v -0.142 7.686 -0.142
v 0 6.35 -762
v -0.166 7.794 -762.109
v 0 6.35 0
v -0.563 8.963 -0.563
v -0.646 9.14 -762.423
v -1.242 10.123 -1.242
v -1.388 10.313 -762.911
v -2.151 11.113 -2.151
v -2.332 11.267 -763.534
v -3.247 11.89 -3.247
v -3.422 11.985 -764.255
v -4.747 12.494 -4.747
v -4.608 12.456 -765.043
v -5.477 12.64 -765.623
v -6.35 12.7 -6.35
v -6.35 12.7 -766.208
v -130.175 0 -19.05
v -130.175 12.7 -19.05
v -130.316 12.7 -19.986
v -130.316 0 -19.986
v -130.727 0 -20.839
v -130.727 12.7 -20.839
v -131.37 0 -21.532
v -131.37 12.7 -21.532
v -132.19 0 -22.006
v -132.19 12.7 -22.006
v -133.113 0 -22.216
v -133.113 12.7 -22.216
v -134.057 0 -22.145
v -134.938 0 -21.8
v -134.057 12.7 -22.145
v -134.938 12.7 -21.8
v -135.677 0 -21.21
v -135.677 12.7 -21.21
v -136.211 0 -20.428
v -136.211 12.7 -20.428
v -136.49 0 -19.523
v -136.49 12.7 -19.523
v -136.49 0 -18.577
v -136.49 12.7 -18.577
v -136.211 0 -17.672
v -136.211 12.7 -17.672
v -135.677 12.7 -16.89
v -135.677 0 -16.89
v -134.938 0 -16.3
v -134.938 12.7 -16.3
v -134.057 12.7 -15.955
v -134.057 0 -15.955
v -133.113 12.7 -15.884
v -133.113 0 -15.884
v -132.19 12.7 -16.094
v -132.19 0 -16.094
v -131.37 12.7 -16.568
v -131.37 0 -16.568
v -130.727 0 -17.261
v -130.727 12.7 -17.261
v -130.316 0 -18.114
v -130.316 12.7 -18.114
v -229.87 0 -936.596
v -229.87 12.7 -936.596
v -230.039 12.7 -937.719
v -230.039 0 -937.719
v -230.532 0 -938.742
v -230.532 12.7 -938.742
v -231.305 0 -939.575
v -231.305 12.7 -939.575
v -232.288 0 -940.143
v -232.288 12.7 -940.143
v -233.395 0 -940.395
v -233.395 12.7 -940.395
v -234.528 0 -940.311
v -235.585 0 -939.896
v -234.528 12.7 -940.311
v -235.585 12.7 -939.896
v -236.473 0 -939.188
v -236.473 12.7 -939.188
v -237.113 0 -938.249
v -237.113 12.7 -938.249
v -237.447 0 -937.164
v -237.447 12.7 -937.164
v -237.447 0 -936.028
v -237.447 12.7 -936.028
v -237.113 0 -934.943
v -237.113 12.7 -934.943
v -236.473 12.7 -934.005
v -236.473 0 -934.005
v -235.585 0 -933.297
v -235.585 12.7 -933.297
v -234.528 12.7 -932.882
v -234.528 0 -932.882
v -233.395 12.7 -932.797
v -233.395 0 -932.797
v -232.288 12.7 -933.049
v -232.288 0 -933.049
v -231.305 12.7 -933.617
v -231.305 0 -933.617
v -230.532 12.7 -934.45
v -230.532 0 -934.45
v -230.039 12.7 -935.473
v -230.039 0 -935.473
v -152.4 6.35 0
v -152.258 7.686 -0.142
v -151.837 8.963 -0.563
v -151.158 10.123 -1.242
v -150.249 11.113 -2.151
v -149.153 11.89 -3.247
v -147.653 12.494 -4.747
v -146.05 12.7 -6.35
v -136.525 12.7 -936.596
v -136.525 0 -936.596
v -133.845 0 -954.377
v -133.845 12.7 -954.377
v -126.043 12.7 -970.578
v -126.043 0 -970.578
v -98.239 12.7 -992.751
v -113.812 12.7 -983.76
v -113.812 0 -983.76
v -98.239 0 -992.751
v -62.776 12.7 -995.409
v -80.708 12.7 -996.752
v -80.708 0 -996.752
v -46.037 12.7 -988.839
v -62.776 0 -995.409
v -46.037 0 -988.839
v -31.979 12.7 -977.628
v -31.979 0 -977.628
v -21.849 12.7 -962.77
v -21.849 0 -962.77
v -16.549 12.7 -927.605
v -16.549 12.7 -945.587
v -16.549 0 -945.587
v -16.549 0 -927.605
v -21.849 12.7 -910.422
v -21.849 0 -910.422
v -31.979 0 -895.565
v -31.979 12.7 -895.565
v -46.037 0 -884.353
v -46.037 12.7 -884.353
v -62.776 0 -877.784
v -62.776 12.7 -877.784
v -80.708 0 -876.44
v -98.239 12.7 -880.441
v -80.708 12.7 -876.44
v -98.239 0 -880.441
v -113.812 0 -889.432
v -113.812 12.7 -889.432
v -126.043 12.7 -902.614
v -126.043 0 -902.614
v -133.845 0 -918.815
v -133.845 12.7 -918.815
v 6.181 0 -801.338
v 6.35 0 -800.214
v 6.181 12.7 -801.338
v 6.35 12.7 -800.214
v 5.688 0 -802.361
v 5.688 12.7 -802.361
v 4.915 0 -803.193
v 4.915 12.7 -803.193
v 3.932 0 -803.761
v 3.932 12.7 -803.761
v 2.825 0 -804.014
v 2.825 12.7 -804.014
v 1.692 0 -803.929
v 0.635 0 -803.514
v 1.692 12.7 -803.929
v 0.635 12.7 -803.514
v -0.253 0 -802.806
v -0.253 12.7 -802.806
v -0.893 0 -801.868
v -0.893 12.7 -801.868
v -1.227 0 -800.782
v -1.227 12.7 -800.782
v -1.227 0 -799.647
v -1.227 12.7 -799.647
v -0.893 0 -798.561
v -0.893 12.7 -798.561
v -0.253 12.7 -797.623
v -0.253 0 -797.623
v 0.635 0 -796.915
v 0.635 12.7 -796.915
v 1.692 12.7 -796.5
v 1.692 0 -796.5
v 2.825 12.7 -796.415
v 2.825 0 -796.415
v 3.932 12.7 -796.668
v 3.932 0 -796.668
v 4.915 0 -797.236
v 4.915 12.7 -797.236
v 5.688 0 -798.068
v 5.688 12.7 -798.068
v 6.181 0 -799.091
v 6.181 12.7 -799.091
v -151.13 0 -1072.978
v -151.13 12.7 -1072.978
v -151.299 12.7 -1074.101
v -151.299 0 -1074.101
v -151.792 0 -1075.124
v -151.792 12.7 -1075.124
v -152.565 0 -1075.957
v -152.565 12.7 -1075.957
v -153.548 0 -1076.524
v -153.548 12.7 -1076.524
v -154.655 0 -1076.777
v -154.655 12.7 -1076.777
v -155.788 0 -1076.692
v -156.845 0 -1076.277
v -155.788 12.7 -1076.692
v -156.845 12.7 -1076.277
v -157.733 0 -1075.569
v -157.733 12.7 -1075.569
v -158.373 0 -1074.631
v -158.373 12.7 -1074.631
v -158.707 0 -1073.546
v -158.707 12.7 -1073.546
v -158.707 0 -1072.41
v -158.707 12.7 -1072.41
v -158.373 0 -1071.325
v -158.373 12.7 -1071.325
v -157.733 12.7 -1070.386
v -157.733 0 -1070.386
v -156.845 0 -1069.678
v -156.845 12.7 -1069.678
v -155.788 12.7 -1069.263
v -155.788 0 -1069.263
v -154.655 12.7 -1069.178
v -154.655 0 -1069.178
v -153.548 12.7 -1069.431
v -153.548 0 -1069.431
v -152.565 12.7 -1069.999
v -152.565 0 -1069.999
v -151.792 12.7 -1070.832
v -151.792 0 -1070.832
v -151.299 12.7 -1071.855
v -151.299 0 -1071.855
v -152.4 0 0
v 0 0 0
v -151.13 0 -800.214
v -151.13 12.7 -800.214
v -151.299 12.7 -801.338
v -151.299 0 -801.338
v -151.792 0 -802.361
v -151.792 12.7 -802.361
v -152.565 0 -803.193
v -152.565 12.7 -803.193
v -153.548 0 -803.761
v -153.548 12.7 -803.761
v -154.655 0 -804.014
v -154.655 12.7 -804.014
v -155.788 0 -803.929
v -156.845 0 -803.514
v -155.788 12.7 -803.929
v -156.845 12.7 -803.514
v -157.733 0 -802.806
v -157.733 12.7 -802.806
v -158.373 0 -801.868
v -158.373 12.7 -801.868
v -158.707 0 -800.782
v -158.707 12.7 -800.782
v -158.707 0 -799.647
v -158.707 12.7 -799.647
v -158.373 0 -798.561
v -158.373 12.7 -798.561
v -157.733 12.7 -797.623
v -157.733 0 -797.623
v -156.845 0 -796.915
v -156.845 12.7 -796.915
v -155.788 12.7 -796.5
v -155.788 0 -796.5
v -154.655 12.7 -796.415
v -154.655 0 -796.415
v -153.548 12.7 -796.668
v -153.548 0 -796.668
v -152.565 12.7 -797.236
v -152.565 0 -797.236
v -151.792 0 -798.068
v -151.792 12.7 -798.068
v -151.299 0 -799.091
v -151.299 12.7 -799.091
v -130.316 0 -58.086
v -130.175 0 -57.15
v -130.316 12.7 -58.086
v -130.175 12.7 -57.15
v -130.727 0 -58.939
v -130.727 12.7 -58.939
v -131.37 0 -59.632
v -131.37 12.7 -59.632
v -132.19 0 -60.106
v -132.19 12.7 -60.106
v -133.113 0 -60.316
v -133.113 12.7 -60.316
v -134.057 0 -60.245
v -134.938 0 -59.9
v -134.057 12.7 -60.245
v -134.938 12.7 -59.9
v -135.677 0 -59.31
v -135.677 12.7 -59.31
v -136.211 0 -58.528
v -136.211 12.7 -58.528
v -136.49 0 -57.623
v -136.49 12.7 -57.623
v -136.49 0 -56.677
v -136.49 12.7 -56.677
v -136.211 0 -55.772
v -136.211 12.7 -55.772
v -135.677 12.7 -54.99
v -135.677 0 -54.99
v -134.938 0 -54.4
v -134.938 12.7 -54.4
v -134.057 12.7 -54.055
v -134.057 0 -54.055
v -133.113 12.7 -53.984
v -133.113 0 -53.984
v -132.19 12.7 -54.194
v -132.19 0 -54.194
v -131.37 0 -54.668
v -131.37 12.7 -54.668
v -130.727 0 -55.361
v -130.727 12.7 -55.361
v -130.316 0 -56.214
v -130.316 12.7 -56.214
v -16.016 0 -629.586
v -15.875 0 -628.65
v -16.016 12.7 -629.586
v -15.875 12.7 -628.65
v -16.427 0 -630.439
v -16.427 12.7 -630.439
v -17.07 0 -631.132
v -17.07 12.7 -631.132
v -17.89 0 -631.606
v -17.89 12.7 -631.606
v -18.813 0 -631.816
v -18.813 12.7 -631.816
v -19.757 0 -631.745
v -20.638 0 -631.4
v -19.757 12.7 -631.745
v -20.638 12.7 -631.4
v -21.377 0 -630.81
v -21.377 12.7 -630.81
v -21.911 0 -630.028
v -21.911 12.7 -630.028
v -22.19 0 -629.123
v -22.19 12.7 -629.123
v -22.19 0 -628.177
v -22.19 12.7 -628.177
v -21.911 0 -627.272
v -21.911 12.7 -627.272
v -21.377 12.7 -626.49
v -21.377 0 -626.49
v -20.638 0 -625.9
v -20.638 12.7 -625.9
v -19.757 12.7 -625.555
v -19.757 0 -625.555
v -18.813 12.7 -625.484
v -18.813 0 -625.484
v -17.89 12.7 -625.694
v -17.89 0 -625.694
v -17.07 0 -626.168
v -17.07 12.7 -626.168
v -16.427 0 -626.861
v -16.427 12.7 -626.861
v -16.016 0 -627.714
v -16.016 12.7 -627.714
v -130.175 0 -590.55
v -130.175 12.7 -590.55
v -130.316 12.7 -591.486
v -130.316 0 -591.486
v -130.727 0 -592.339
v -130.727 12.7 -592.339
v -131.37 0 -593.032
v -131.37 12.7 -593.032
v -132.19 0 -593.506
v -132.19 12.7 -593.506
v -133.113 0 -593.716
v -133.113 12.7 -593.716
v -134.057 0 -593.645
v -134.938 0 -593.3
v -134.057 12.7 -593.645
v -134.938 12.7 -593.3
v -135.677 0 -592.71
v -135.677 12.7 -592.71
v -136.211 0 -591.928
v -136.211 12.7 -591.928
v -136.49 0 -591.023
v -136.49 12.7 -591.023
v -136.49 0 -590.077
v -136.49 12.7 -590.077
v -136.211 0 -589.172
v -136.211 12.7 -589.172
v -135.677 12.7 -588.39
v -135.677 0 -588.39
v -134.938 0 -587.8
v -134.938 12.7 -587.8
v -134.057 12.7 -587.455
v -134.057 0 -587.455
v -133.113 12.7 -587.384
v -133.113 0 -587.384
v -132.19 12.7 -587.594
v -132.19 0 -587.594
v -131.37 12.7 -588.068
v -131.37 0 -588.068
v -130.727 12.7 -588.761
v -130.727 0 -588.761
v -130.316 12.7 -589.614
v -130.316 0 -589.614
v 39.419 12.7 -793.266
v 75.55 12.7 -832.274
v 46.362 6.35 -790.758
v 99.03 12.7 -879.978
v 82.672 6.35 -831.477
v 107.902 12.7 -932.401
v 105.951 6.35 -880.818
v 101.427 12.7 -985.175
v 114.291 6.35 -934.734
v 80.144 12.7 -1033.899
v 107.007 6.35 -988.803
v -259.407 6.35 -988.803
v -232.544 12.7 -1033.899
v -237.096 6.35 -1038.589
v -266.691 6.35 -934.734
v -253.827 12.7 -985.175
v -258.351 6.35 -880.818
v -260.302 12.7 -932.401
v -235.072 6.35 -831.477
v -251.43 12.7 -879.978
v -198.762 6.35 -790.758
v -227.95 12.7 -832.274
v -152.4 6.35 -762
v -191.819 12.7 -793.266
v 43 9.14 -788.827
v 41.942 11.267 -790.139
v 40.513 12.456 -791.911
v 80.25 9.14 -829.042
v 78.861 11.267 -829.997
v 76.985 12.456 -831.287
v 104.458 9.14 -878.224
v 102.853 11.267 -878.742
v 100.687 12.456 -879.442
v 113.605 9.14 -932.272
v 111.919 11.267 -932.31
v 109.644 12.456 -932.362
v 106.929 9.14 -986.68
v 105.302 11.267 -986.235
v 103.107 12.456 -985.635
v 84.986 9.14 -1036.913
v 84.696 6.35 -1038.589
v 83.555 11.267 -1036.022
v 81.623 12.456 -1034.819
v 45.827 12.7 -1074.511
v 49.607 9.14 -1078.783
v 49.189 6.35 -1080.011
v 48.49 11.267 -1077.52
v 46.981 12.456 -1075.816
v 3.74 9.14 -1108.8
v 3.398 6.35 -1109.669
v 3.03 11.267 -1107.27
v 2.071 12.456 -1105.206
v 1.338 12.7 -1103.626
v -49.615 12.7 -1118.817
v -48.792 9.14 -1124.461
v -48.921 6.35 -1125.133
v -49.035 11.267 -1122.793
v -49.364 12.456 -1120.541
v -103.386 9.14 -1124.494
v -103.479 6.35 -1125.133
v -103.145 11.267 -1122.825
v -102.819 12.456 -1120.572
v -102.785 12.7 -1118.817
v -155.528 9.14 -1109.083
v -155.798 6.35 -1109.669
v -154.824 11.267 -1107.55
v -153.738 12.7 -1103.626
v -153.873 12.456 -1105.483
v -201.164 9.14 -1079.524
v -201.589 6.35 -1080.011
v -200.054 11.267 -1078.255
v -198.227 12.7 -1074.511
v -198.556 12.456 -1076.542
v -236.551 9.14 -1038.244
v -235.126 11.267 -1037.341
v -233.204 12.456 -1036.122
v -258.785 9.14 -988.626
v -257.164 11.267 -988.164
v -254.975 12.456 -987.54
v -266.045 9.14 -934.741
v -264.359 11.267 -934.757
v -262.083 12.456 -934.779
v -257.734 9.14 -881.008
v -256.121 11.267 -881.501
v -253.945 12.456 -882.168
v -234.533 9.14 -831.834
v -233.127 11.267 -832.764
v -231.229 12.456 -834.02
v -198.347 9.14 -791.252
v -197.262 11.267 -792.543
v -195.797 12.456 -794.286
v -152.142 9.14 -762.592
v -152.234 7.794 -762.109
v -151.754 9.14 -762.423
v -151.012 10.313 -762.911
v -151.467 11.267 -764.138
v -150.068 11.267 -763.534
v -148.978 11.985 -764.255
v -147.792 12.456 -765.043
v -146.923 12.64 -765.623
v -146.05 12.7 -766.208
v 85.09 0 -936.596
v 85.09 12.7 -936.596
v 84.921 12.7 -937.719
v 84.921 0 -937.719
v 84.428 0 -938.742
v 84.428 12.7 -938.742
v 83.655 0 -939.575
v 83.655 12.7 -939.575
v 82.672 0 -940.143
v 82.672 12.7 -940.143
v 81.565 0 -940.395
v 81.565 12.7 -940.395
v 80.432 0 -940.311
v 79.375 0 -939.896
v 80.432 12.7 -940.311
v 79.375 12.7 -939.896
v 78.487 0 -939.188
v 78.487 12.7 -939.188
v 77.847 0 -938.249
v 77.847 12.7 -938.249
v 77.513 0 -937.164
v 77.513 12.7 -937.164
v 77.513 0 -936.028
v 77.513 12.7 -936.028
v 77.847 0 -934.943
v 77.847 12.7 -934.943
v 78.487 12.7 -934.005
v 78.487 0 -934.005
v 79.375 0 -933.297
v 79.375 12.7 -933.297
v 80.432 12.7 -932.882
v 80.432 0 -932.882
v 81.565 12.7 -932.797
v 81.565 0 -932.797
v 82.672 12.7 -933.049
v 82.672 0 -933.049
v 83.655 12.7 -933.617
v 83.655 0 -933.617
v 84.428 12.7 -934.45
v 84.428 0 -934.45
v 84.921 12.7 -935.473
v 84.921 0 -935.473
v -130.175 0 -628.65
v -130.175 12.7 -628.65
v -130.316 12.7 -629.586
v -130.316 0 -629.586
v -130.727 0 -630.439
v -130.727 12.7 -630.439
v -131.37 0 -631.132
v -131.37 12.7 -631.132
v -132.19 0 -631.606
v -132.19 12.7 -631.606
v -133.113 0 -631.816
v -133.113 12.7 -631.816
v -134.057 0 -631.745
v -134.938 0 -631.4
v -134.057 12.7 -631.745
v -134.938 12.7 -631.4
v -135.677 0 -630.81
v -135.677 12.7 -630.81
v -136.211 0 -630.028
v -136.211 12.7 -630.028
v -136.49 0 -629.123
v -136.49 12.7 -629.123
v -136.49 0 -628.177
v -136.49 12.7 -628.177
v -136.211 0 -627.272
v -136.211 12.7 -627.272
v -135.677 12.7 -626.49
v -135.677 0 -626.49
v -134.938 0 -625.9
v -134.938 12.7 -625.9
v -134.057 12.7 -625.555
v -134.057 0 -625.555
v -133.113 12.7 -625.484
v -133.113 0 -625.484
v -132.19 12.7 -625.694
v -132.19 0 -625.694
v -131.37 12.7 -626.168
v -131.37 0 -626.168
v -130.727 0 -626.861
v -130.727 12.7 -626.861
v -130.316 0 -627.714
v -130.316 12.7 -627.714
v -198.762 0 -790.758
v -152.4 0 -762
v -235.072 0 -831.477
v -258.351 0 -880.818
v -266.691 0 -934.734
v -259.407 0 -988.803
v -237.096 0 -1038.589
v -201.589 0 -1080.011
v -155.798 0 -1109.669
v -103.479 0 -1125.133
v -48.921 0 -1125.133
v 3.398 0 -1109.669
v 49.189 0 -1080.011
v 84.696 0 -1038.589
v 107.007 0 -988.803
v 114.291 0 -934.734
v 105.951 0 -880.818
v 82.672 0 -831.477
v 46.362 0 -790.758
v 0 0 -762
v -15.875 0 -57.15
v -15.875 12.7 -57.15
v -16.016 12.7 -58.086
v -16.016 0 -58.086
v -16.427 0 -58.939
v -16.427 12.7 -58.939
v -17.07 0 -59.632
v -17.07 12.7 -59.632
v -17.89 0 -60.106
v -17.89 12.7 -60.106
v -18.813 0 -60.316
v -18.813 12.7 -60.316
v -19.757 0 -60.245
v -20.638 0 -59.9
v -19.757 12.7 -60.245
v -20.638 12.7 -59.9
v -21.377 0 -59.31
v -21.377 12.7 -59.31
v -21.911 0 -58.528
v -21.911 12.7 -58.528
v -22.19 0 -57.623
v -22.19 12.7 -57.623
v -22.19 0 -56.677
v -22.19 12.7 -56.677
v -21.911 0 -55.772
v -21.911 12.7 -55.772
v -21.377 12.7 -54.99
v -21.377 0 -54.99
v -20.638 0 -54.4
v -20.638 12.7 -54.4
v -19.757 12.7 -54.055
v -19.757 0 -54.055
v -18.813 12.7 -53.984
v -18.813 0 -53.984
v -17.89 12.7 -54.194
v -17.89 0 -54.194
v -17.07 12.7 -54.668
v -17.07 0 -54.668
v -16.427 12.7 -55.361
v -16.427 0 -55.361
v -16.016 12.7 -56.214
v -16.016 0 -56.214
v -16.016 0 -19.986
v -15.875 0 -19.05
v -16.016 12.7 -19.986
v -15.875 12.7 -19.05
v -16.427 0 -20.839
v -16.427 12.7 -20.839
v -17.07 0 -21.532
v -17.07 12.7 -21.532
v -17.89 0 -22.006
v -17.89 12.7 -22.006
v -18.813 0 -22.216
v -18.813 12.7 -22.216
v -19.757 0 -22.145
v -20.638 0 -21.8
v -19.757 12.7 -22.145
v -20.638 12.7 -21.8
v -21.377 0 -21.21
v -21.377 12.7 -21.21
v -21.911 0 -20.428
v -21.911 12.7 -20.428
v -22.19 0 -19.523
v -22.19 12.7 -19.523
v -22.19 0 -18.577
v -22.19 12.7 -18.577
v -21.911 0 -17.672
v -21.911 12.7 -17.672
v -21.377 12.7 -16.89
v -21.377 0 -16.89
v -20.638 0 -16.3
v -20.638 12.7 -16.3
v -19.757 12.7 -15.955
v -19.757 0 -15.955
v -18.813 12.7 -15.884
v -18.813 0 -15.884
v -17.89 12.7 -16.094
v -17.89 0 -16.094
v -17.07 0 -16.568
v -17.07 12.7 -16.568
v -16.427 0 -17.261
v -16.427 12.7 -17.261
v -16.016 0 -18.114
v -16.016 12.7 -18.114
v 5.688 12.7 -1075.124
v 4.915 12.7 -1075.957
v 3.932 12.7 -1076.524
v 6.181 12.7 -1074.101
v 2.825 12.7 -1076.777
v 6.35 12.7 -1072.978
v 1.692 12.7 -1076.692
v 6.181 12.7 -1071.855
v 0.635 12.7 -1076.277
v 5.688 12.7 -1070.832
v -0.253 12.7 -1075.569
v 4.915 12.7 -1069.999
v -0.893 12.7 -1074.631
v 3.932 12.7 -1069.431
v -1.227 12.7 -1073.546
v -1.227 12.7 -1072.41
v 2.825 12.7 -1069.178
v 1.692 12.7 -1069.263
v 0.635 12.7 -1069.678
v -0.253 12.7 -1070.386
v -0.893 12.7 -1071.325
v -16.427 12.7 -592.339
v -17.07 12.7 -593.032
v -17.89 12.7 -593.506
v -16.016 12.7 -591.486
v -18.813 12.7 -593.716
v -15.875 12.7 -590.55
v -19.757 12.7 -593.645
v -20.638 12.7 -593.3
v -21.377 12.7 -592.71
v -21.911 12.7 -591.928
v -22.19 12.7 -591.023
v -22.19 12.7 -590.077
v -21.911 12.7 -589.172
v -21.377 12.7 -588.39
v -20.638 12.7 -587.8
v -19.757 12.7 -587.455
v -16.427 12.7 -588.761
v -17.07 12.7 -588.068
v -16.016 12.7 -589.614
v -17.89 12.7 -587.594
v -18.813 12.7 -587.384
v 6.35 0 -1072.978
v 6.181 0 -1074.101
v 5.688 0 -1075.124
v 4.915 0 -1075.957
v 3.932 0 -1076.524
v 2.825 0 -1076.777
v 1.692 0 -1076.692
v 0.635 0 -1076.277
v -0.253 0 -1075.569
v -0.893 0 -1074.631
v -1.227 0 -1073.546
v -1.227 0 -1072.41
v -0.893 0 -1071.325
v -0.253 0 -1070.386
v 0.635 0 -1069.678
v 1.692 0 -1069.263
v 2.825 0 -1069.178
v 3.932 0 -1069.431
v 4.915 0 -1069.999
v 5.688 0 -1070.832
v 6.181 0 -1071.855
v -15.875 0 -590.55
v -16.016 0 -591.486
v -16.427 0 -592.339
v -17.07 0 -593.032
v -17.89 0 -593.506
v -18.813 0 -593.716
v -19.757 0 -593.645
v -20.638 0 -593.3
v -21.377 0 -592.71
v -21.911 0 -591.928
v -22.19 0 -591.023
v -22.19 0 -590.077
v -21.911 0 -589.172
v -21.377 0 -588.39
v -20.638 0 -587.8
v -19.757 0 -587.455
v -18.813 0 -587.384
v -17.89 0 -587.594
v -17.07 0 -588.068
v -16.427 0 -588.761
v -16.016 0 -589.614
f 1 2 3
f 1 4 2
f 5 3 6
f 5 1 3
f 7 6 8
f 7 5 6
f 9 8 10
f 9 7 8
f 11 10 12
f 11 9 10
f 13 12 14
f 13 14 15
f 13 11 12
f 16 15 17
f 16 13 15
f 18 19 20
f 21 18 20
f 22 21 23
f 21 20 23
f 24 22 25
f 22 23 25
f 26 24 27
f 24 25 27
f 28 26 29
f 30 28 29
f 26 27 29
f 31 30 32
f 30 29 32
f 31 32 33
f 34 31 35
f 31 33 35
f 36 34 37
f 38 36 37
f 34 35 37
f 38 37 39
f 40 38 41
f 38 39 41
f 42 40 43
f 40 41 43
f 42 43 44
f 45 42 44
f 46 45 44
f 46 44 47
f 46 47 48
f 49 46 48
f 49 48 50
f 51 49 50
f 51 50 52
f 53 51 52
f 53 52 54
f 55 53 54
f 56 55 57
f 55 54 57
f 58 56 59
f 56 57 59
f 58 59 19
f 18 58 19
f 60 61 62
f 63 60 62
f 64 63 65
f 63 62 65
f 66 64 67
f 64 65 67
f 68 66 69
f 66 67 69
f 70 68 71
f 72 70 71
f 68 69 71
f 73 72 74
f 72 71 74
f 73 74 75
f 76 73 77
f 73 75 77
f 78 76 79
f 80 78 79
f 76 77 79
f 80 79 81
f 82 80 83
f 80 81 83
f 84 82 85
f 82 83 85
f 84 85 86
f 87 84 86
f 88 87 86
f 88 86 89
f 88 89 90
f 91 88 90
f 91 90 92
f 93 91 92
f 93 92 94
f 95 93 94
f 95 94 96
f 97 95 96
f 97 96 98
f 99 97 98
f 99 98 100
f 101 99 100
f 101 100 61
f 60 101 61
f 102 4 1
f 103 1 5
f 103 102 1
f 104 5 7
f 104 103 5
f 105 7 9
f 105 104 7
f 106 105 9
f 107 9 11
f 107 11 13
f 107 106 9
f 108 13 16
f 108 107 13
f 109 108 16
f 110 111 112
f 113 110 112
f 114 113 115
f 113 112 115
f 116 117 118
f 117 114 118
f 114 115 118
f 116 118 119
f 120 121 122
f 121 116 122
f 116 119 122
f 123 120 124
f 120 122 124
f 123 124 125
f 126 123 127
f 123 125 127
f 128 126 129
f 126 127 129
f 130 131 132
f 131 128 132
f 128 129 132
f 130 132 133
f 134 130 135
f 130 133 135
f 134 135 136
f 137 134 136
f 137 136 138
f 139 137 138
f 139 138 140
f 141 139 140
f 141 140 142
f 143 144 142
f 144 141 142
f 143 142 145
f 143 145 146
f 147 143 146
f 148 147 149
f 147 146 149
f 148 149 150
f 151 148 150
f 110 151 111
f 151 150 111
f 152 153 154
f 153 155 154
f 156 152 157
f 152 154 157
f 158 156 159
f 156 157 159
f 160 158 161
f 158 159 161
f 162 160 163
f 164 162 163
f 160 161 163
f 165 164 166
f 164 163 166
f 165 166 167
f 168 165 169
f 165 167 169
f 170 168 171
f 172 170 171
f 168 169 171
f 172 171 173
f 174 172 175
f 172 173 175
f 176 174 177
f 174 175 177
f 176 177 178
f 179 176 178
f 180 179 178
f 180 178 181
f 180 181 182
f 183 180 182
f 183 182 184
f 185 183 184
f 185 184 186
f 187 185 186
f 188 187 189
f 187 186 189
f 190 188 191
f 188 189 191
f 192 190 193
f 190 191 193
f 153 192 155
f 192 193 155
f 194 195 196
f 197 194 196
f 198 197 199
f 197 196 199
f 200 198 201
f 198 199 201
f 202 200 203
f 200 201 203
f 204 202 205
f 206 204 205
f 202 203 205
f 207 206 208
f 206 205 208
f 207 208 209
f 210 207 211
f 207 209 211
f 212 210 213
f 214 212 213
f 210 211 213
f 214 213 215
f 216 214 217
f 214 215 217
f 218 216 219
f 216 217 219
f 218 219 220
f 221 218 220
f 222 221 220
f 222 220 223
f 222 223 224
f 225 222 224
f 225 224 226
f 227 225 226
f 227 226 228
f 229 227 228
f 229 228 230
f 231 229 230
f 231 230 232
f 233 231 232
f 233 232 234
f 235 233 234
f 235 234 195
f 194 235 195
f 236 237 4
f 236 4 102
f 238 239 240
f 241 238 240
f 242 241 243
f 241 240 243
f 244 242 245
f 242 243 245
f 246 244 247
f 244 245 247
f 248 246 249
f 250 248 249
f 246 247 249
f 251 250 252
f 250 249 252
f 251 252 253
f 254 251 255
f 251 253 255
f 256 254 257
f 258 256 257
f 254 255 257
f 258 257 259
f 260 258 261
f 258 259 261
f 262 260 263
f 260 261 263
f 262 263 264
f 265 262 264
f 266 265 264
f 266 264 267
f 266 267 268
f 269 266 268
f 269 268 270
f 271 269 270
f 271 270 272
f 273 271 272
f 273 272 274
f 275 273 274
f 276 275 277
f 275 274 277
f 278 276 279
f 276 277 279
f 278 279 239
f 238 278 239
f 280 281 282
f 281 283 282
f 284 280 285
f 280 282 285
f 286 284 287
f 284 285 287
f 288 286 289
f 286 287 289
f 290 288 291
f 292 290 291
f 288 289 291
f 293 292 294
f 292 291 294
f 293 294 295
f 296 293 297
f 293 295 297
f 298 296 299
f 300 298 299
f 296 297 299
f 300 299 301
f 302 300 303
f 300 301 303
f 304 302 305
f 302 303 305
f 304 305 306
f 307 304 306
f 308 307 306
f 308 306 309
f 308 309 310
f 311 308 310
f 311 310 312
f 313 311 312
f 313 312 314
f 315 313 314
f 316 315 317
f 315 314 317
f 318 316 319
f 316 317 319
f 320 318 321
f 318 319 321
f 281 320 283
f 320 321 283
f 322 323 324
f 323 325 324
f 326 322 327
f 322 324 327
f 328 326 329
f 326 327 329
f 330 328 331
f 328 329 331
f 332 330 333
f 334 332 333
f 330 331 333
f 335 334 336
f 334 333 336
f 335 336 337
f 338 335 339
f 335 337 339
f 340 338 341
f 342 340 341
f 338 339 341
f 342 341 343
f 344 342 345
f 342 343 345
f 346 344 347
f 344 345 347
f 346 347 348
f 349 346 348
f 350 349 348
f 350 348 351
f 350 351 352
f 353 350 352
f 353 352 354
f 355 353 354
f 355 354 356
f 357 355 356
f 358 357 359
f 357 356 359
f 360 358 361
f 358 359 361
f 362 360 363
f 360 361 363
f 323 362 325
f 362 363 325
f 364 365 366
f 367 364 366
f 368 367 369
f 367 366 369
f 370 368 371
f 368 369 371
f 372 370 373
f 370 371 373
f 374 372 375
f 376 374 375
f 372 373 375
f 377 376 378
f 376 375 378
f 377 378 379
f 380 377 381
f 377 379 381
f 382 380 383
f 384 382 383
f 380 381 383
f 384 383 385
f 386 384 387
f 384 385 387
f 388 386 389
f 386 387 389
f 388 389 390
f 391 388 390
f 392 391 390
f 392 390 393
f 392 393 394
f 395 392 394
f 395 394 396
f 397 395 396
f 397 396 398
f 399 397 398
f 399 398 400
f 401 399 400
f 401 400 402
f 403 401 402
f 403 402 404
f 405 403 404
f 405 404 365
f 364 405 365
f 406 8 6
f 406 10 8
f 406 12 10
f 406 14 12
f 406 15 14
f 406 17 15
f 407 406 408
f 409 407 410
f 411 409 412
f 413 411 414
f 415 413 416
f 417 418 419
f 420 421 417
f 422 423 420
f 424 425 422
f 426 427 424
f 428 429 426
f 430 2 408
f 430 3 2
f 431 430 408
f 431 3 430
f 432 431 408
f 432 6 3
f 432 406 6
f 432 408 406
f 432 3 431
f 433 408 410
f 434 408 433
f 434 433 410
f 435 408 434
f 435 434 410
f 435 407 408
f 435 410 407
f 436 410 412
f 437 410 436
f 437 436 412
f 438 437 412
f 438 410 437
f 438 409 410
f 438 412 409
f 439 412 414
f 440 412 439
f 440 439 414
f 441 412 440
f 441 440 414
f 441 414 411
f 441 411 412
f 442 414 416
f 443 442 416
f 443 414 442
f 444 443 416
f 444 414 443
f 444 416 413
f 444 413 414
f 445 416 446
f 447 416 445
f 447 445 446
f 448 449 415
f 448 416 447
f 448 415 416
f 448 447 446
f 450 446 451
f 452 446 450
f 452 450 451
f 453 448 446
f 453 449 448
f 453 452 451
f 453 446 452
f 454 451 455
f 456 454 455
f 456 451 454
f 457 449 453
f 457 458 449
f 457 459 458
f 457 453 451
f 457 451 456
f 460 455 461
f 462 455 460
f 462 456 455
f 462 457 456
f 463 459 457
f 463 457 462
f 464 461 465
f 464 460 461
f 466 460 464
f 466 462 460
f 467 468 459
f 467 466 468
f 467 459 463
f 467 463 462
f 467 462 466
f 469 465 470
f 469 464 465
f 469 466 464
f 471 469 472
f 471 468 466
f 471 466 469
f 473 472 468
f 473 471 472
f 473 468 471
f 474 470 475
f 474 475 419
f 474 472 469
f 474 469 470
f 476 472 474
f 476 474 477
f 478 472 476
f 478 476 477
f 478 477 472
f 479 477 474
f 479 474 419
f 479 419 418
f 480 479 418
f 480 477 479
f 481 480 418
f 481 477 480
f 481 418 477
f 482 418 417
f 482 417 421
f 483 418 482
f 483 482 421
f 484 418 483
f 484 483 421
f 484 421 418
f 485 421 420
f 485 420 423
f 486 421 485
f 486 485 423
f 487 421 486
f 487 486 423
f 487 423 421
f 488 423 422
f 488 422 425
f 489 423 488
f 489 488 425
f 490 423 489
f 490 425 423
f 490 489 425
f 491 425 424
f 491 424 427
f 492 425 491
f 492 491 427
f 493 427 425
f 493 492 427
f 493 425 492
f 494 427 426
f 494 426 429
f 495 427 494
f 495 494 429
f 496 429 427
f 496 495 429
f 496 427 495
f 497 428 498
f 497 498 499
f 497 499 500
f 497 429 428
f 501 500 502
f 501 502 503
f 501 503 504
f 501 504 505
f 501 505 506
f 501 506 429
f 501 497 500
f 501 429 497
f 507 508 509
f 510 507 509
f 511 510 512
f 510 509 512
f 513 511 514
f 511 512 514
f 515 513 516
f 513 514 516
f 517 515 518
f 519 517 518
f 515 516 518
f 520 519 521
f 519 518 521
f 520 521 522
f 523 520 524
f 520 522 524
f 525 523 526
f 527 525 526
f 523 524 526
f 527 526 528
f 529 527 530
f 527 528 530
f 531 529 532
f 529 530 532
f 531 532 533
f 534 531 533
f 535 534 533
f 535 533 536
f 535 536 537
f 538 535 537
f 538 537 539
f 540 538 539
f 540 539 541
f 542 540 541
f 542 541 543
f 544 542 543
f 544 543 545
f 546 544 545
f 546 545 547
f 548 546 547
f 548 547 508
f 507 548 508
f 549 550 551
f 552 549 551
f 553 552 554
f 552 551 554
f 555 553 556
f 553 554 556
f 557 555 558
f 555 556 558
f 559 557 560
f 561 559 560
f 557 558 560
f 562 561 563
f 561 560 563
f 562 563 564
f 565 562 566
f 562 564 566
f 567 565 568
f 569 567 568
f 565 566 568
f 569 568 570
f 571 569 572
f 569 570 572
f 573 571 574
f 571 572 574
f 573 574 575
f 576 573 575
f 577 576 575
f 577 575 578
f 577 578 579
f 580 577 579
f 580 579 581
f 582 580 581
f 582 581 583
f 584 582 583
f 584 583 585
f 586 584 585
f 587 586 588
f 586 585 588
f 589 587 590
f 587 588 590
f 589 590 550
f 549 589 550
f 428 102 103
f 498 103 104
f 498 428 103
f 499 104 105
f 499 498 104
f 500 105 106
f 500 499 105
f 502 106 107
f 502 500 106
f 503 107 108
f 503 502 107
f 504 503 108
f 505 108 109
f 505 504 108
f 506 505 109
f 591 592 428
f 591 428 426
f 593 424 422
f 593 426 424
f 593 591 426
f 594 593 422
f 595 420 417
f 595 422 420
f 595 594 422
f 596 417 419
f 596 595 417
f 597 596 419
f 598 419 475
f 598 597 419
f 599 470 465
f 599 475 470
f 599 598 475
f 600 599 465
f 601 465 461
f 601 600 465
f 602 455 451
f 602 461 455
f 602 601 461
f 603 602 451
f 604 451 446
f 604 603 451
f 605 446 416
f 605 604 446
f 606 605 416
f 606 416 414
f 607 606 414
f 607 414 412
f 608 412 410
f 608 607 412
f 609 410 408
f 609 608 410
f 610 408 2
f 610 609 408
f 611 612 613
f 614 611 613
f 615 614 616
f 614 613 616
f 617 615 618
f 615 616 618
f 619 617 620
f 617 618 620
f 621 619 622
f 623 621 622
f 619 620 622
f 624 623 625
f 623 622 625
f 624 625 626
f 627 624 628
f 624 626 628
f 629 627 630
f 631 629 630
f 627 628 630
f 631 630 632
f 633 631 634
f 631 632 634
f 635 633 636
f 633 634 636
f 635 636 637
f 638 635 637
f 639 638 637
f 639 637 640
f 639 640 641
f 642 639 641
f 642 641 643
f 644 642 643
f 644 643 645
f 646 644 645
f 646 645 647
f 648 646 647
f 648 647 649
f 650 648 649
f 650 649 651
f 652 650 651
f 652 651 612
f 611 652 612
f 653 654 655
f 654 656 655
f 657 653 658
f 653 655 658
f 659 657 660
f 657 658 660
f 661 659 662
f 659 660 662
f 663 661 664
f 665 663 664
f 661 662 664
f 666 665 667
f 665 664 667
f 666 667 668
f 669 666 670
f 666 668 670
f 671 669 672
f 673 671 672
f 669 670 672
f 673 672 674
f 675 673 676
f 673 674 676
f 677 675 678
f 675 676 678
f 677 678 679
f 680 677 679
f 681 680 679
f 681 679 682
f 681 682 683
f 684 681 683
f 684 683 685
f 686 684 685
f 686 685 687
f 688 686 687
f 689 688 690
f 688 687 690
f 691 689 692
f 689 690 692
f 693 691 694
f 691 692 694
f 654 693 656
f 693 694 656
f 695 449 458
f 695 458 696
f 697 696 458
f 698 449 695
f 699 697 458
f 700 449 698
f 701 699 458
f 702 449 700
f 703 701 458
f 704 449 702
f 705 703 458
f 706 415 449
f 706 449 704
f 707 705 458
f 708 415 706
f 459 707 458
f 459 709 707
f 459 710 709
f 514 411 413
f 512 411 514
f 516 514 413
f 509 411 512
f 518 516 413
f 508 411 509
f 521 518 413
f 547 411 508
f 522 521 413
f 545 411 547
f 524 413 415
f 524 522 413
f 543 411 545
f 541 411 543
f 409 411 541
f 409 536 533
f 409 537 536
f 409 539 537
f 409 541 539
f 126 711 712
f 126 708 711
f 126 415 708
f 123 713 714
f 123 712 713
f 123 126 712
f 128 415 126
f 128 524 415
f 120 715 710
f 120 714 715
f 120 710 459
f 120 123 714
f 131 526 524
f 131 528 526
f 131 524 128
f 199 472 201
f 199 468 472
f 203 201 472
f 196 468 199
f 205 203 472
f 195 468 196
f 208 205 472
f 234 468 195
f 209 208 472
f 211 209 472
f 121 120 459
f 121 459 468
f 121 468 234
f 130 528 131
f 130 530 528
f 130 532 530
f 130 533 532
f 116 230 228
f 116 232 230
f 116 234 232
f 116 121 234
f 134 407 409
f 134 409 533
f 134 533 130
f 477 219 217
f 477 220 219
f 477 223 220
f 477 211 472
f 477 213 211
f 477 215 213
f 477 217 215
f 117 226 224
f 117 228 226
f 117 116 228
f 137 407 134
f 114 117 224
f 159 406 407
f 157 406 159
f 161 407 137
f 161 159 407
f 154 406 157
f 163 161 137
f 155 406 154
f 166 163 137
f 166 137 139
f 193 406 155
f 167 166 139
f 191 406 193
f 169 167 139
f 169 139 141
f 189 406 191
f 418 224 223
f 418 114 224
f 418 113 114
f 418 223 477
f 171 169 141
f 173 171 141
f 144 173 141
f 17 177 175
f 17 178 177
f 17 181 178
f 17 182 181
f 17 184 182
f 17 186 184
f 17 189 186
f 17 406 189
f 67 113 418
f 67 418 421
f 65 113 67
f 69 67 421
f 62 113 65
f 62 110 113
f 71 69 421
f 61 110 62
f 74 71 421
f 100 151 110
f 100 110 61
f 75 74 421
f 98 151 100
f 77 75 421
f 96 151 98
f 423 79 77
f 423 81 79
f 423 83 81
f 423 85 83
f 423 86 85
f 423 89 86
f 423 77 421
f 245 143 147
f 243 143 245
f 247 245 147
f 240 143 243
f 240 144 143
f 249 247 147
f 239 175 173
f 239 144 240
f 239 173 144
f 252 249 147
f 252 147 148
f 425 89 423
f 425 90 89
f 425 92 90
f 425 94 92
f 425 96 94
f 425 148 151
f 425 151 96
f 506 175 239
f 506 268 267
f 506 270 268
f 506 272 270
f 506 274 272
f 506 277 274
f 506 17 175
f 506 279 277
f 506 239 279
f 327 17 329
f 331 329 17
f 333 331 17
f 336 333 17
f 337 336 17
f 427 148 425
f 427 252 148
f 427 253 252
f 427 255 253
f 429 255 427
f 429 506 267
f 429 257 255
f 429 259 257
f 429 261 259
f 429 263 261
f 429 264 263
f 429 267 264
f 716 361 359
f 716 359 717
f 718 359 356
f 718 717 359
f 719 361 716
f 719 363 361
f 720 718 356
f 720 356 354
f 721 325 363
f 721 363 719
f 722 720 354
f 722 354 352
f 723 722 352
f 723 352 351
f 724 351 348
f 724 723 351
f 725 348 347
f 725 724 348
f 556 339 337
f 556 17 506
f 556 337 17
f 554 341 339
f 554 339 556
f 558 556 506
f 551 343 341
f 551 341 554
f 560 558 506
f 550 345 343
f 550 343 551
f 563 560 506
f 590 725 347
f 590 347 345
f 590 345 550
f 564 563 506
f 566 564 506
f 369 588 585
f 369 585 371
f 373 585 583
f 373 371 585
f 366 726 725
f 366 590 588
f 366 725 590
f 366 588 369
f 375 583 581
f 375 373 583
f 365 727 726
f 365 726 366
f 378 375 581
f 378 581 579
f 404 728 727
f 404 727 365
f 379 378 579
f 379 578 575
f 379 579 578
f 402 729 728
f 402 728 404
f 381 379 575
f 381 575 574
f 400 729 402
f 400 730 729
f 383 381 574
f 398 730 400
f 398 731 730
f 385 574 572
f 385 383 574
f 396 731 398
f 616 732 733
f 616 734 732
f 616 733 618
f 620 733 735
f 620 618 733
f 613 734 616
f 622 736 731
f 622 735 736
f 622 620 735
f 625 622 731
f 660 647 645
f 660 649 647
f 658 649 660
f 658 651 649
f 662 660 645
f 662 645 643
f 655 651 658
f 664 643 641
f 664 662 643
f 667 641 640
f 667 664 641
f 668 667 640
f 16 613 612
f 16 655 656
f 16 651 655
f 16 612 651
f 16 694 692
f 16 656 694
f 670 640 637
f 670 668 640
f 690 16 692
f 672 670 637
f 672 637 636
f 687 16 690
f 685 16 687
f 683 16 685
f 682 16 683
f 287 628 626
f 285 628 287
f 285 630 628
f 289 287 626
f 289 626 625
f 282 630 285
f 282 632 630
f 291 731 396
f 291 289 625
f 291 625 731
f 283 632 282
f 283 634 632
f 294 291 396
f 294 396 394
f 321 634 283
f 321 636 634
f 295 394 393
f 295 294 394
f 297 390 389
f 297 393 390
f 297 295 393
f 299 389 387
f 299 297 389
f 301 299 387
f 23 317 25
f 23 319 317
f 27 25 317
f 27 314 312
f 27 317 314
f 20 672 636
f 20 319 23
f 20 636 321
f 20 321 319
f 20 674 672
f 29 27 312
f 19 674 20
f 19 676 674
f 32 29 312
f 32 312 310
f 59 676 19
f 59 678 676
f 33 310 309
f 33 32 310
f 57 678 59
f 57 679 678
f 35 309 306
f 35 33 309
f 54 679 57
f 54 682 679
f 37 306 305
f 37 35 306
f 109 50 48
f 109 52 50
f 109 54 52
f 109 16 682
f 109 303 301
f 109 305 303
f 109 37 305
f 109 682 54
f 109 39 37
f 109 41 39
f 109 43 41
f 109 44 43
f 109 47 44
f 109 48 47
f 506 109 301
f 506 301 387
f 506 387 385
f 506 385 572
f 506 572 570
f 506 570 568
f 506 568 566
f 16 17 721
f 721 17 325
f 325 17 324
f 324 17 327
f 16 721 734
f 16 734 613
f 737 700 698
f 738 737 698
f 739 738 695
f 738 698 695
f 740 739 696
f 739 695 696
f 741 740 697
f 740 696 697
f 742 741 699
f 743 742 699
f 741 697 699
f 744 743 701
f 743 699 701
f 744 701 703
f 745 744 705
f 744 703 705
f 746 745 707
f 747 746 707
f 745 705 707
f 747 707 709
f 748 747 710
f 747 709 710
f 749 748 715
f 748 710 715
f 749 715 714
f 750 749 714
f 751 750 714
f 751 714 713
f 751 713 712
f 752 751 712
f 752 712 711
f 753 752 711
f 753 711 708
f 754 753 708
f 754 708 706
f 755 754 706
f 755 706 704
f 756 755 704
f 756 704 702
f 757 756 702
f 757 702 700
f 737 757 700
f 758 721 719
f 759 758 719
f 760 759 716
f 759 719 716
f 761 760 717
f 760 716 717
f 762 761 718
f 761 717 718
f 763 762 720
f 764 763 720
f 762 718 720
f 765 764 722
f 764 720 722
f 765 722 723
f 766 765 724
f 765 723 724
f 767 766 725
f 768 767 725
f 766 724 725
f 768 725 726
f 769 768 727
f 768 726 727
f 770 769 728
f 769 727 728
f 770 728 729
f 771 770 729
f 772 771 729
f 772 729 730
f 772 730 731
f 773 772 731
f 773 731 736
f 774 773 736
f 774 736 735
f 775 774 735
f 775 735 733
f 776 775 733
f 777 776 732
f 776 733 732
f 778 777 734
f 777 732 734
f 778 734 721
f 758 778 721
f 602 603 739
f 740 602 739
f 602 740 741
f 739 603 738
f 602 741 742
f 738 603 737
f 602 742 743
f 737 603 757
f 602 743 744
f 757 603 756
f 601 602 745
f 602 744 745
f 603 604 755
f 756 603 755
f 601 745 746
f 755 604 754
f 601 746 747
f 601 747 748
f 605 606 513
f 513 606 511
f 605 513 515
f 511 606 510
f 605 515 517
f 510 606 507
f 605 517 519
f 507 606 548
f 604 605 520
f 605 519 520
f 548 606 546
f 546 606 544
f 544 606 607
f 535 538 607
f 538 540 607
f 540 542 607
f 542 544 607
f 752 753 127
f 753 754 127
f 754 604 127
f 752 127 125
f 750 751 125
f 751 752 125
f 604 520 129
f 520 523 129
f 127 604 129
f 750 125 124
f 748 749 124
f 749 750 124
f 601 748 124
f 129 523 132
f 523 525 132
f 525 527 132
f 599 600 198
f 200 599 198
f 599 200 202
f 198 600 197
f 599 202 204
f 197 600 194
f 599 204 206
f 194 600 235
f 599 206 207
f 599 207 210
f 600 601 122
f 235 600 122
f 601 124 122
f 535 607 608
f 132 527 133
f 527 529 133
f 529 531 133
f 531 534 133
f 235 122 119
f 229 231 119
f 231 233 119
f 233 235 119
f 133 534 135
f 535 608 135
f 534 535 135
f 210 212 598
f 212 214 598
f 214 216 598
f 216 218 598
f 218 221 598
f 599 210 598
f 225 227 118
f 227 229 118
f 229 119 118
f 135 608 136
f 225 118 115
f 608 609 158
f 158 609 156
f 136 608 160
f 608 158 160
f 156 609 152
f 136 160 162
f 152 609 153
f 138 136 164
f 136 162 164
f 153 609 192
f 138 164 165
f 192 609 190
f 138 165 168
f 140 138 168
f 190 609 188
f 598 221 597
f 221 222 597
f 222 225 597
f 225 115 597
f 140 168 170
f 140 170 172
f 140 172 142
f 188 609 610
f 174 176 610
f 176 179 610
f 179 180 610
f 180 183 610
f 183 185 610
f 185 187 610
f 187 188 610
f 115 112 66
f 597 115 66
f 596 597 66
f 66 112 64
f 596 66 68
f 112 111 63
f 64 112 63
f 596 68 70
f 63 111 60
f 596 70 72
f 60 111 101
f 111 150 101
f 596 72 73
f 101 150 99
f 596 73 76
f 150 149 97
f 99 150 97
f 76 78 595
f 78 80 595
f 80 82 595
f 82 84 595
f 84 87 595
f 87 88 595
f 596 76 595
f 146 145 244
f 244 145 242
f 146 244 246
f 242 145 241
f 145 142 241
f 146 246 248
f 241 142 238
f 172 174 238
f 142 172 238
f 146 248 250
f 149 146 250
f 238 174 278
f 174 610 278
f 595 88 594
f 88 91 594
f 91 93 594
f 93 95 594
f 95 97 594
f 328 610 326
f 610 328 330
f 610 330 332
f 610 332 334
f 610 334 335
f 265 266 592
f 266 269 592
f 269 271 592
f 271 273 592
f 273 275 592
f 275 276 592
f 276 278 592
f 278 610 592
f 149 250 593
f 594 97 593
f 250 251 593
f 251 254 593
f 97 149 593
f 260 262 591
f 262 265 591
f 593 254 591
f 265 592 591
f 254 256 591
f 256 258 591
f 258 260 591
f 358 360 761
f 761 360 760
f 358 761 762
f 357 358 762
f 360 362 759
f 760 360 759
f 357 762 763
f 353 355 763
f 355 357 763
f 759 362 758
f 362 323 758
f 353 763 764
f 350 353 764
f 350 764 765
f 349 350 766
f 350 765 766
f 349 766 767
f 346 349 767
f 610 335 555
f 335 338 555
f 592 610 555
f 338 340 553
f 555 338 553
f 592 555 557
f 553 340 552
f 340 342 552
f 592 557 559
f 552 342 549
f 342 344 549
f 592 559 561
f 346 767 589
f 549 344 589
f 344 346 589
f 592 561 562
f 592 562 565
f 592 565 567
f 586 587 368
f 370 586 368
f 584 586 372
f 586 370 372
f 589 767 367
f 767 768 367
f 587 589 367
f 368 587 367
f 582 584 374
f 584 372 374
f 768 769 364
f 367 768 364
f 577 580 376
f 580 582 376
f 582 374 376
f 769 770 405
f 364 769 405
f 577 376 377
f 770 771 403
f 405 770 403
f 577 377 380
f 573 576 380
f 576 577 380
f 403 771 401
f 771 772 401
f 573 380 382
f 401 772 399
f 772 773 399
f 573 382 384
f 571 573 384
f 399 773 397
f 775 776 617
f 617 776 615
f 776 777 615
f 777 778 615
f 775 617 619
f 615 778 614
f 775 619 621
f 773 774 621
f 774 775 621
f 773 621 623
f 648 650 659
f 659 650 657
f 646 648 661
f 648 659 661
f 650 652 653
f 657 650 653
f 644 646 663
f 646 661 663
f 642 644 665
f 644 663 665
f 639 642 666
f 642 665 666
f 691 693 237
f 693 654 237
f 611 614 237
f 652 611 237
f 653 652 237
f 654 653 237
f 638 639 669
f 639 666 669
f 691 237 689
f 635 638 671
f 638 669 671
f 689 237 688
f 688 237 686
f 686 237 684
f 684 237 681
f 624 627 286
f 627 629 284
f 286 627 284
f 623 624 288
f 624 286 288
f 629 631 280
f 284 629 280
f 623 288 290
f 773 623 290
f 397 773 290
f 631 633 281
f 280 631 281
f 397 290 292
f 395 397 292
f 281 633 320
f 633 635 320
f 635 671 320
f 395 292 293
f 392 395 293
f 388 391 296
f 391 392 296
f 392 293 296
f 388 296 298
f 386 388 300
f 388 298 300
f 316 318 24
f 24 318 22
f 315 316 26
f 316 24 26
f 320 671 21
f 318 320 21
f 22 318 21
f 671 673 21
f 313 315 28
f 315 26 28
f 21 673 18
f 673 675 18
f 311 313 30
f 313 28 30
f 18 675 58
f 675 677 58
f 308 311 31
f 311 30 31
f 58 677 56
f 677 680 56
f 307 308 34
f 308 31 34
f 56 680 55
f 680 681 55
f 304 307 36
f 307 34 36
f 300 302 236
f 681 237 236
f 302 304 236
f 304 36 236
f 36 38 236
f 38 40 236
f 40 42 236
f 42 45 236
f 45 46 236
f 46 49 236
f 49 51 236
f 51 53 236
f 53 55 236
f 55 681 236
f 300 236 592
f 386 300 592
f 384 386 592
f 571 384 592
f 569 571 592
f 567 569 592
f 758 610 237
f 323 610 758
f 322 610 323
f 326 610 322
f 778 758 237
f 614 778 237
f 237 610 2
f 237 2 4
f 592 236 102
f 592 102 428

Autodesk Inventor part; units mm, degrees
ref_plane "YZ Plane" through (0, 0, 0) normal (1, 0, 0) x (0, 1, 0)
ref_plane "XZ Plane" through (0, 0, 0) normal (0, 1, 0) x (-1, 0, 0)
ref_plane "XY Plane" through (0, 0, 0) normal (0, 0, 1) x (1, 0, 0)
sketch "Sketch1" plane through (0, 0, 0) normal (0, 1, 0) x (-1, 0, 0)
  line L0 (0, 0) -> (152.4, 0)
  line L1 (152.4, 0) -> (152.4, -762)
  line L2 (0, -762) -> (0, 0)
  line L3 (152.4, -762) -> (0, -762) construction
  arc A0 (0, -762) -> (152.4, -762) centre (76.2, -936.5961) ccw
  line L4 (152.4, -590.1365) -> (152.4, -762) construction
  circle A1 centre (76.2, -936.5961) radius 60.325
  dimension "d1" = 762
  dimension "d5" = 381
  dimension "d6" = 120.65
  dimension "d11" = 762
extrude "Extrusion1" add sketch "Sketch1" along normal blind 12.7
fillet "Fillet1" radius 6.35 4 edges at (-76.2, 12.7, 0) (0, 12.7, -381) (-152.4, 12.7, -381) (-76.2, 12.7, -1127.0961)
sketch "Sketch2" plane through (0, 12.7, 0) normal (0, 1, 0) x (1, 0, 0)
  circle A0 centre (-76.2, 936.5961) radius 60.325 construction
  line L0 (-76.2, 936.5961) -> (-76.2, 876.2711) construction
  circle A1 centre (-76.2, 936.5961) radius 157.48 construction
  circle A2 centre (-233.68, 936.5961) radius 3.81
  circle A3 centre (-154.94, 800.2145) radius 3.81
  circle A4 centre (2.54, 800.2145) radius 3.81
  circle A5 centre (81.28, 936.5961) radius 3.81
  circle A6 centre (2.54, 1072.9778) radius 3.81
  circle A7 centre (-154.94, 1072.9778) radius 3.81
  point P0 (0, 0)
  dimension "d10" = 314.96
  dimension "d12" = 7.62
  dimension "d15" = 360
extrude "Extrusion2" cut sketch "Sketch2" against normal blind 12.7
sketch "Sketch3" plane through (0, 12.7, 0) normal (0, 1, 0) x (1, 0, 0)
  line L0 (0, 0) -> (-152.4, 0) construction
  line L1 (-76.2, 0) -> (-76.2, 12.7) construction
  line L2 (-76.2, 0) -> (-63.5, 0) construction
  line L3 (-12.7, 15.875) -> (-12.7, 60.325) construction
  line L4 (-15.875, 63.5) -> (-136.525, 63.5) construction
  line L5 (-139.7, 60.325) -> (-139.7, 15.875) construction
  line L6 (-136.525, 12.7) -> (-15.875, 12.7) construction
  circle A0 centre (-19.05, 57.15) radius 3.175
  circle A1 centre (-19.05, 57.15) radius 3.175
  circle A2 centre (-19.05, 19.05) radius 3.175
  circle A3 centre (-19.05, 19.05) radius 3.175
  circle A4 centre (-133.35, 57.15) radius 3.175
  circle A5 centre (-133.35, 57.15) radius 3.175
  circle A6 centre (-133.35, 19.05) radius 3.175
  arc A7 (-12.7, 60.325) -> (-15.875, 63.5) centre (-15.875, 60.325) ccw construction
  arc A8 (-15.875, 12.7) -> (-12.7, 15.875) centre (-15.875, 15.875) ccw construction
  arc A9 (-139.7, 15.875) -> (-136.525, 12.7) centre (-136.525, 15.875) ccw construction
  arc A10 (-136.525, 63.5) -> (-139.7, 60.325) centre (-136.525, 60.325) ccw construction
  line L7 (-76.2, 12.7) -> (-76.2, 63.5) construction
  line L8 (-76.2, 63.5) -> (-76.2, 584.2) construction
  line L9 (-139.7, 676.656) -> (-104.4, 676.656) construction
  line L10 (-139.7, 676.656) -> (-139.7, 587.375) construction
  line L11 (-136.525, 584.2) -> (-15.875, 584.2) construction
  line L12 (-12.7, 587.375) -> (-12.7, 676.656) construction
  line L13 (-12.7, 676.656) -> (-139.7, 676.656) construction
  arc A11 (-139.7, 587.375) -> (-136.525, 584.2) centre (-136.525, 587.375) ccw construction
  arc A12 (-15.875, 584.2) -> (-12.7, 587.375) centre (-15.875, 587.375) ccw construction
  circle A13 centre (-133.35, 590.55) radius 3.175
  circle A14 centre (-133.35, 590.55) radius 3.175
  circle A15 centre (-133.35, 628.65) radius 3.175
  circle A16 centre (-133.35, 628.65) radius 3.175
  circle A17 centre (-19.05, 590.55) radius 3.175
  circle A18 centre (-19.05, 590.55) radius 3.175
  circle A19 centre (-19.05, 628.65) radius 3.175
  circle A20 centre (-19.05, 628.65) radius 3.175
  line L14 (-76.2, 584.2) -> (-76.2, 676.656) construction
  point P0 (-12.7, 12.7)
  point P1 (-139.7, 635)
  dimension "d19" = 12.7
  dimension "d20" = 90
  dimension "d21" = 3.175
  dimension "d24" = 520.7
  dimension "d26" = 3.175
extrude "Extrusion3" cut sketch "Sketch3" against normal blind 12.7
properties part number "Arm Layer 1"
